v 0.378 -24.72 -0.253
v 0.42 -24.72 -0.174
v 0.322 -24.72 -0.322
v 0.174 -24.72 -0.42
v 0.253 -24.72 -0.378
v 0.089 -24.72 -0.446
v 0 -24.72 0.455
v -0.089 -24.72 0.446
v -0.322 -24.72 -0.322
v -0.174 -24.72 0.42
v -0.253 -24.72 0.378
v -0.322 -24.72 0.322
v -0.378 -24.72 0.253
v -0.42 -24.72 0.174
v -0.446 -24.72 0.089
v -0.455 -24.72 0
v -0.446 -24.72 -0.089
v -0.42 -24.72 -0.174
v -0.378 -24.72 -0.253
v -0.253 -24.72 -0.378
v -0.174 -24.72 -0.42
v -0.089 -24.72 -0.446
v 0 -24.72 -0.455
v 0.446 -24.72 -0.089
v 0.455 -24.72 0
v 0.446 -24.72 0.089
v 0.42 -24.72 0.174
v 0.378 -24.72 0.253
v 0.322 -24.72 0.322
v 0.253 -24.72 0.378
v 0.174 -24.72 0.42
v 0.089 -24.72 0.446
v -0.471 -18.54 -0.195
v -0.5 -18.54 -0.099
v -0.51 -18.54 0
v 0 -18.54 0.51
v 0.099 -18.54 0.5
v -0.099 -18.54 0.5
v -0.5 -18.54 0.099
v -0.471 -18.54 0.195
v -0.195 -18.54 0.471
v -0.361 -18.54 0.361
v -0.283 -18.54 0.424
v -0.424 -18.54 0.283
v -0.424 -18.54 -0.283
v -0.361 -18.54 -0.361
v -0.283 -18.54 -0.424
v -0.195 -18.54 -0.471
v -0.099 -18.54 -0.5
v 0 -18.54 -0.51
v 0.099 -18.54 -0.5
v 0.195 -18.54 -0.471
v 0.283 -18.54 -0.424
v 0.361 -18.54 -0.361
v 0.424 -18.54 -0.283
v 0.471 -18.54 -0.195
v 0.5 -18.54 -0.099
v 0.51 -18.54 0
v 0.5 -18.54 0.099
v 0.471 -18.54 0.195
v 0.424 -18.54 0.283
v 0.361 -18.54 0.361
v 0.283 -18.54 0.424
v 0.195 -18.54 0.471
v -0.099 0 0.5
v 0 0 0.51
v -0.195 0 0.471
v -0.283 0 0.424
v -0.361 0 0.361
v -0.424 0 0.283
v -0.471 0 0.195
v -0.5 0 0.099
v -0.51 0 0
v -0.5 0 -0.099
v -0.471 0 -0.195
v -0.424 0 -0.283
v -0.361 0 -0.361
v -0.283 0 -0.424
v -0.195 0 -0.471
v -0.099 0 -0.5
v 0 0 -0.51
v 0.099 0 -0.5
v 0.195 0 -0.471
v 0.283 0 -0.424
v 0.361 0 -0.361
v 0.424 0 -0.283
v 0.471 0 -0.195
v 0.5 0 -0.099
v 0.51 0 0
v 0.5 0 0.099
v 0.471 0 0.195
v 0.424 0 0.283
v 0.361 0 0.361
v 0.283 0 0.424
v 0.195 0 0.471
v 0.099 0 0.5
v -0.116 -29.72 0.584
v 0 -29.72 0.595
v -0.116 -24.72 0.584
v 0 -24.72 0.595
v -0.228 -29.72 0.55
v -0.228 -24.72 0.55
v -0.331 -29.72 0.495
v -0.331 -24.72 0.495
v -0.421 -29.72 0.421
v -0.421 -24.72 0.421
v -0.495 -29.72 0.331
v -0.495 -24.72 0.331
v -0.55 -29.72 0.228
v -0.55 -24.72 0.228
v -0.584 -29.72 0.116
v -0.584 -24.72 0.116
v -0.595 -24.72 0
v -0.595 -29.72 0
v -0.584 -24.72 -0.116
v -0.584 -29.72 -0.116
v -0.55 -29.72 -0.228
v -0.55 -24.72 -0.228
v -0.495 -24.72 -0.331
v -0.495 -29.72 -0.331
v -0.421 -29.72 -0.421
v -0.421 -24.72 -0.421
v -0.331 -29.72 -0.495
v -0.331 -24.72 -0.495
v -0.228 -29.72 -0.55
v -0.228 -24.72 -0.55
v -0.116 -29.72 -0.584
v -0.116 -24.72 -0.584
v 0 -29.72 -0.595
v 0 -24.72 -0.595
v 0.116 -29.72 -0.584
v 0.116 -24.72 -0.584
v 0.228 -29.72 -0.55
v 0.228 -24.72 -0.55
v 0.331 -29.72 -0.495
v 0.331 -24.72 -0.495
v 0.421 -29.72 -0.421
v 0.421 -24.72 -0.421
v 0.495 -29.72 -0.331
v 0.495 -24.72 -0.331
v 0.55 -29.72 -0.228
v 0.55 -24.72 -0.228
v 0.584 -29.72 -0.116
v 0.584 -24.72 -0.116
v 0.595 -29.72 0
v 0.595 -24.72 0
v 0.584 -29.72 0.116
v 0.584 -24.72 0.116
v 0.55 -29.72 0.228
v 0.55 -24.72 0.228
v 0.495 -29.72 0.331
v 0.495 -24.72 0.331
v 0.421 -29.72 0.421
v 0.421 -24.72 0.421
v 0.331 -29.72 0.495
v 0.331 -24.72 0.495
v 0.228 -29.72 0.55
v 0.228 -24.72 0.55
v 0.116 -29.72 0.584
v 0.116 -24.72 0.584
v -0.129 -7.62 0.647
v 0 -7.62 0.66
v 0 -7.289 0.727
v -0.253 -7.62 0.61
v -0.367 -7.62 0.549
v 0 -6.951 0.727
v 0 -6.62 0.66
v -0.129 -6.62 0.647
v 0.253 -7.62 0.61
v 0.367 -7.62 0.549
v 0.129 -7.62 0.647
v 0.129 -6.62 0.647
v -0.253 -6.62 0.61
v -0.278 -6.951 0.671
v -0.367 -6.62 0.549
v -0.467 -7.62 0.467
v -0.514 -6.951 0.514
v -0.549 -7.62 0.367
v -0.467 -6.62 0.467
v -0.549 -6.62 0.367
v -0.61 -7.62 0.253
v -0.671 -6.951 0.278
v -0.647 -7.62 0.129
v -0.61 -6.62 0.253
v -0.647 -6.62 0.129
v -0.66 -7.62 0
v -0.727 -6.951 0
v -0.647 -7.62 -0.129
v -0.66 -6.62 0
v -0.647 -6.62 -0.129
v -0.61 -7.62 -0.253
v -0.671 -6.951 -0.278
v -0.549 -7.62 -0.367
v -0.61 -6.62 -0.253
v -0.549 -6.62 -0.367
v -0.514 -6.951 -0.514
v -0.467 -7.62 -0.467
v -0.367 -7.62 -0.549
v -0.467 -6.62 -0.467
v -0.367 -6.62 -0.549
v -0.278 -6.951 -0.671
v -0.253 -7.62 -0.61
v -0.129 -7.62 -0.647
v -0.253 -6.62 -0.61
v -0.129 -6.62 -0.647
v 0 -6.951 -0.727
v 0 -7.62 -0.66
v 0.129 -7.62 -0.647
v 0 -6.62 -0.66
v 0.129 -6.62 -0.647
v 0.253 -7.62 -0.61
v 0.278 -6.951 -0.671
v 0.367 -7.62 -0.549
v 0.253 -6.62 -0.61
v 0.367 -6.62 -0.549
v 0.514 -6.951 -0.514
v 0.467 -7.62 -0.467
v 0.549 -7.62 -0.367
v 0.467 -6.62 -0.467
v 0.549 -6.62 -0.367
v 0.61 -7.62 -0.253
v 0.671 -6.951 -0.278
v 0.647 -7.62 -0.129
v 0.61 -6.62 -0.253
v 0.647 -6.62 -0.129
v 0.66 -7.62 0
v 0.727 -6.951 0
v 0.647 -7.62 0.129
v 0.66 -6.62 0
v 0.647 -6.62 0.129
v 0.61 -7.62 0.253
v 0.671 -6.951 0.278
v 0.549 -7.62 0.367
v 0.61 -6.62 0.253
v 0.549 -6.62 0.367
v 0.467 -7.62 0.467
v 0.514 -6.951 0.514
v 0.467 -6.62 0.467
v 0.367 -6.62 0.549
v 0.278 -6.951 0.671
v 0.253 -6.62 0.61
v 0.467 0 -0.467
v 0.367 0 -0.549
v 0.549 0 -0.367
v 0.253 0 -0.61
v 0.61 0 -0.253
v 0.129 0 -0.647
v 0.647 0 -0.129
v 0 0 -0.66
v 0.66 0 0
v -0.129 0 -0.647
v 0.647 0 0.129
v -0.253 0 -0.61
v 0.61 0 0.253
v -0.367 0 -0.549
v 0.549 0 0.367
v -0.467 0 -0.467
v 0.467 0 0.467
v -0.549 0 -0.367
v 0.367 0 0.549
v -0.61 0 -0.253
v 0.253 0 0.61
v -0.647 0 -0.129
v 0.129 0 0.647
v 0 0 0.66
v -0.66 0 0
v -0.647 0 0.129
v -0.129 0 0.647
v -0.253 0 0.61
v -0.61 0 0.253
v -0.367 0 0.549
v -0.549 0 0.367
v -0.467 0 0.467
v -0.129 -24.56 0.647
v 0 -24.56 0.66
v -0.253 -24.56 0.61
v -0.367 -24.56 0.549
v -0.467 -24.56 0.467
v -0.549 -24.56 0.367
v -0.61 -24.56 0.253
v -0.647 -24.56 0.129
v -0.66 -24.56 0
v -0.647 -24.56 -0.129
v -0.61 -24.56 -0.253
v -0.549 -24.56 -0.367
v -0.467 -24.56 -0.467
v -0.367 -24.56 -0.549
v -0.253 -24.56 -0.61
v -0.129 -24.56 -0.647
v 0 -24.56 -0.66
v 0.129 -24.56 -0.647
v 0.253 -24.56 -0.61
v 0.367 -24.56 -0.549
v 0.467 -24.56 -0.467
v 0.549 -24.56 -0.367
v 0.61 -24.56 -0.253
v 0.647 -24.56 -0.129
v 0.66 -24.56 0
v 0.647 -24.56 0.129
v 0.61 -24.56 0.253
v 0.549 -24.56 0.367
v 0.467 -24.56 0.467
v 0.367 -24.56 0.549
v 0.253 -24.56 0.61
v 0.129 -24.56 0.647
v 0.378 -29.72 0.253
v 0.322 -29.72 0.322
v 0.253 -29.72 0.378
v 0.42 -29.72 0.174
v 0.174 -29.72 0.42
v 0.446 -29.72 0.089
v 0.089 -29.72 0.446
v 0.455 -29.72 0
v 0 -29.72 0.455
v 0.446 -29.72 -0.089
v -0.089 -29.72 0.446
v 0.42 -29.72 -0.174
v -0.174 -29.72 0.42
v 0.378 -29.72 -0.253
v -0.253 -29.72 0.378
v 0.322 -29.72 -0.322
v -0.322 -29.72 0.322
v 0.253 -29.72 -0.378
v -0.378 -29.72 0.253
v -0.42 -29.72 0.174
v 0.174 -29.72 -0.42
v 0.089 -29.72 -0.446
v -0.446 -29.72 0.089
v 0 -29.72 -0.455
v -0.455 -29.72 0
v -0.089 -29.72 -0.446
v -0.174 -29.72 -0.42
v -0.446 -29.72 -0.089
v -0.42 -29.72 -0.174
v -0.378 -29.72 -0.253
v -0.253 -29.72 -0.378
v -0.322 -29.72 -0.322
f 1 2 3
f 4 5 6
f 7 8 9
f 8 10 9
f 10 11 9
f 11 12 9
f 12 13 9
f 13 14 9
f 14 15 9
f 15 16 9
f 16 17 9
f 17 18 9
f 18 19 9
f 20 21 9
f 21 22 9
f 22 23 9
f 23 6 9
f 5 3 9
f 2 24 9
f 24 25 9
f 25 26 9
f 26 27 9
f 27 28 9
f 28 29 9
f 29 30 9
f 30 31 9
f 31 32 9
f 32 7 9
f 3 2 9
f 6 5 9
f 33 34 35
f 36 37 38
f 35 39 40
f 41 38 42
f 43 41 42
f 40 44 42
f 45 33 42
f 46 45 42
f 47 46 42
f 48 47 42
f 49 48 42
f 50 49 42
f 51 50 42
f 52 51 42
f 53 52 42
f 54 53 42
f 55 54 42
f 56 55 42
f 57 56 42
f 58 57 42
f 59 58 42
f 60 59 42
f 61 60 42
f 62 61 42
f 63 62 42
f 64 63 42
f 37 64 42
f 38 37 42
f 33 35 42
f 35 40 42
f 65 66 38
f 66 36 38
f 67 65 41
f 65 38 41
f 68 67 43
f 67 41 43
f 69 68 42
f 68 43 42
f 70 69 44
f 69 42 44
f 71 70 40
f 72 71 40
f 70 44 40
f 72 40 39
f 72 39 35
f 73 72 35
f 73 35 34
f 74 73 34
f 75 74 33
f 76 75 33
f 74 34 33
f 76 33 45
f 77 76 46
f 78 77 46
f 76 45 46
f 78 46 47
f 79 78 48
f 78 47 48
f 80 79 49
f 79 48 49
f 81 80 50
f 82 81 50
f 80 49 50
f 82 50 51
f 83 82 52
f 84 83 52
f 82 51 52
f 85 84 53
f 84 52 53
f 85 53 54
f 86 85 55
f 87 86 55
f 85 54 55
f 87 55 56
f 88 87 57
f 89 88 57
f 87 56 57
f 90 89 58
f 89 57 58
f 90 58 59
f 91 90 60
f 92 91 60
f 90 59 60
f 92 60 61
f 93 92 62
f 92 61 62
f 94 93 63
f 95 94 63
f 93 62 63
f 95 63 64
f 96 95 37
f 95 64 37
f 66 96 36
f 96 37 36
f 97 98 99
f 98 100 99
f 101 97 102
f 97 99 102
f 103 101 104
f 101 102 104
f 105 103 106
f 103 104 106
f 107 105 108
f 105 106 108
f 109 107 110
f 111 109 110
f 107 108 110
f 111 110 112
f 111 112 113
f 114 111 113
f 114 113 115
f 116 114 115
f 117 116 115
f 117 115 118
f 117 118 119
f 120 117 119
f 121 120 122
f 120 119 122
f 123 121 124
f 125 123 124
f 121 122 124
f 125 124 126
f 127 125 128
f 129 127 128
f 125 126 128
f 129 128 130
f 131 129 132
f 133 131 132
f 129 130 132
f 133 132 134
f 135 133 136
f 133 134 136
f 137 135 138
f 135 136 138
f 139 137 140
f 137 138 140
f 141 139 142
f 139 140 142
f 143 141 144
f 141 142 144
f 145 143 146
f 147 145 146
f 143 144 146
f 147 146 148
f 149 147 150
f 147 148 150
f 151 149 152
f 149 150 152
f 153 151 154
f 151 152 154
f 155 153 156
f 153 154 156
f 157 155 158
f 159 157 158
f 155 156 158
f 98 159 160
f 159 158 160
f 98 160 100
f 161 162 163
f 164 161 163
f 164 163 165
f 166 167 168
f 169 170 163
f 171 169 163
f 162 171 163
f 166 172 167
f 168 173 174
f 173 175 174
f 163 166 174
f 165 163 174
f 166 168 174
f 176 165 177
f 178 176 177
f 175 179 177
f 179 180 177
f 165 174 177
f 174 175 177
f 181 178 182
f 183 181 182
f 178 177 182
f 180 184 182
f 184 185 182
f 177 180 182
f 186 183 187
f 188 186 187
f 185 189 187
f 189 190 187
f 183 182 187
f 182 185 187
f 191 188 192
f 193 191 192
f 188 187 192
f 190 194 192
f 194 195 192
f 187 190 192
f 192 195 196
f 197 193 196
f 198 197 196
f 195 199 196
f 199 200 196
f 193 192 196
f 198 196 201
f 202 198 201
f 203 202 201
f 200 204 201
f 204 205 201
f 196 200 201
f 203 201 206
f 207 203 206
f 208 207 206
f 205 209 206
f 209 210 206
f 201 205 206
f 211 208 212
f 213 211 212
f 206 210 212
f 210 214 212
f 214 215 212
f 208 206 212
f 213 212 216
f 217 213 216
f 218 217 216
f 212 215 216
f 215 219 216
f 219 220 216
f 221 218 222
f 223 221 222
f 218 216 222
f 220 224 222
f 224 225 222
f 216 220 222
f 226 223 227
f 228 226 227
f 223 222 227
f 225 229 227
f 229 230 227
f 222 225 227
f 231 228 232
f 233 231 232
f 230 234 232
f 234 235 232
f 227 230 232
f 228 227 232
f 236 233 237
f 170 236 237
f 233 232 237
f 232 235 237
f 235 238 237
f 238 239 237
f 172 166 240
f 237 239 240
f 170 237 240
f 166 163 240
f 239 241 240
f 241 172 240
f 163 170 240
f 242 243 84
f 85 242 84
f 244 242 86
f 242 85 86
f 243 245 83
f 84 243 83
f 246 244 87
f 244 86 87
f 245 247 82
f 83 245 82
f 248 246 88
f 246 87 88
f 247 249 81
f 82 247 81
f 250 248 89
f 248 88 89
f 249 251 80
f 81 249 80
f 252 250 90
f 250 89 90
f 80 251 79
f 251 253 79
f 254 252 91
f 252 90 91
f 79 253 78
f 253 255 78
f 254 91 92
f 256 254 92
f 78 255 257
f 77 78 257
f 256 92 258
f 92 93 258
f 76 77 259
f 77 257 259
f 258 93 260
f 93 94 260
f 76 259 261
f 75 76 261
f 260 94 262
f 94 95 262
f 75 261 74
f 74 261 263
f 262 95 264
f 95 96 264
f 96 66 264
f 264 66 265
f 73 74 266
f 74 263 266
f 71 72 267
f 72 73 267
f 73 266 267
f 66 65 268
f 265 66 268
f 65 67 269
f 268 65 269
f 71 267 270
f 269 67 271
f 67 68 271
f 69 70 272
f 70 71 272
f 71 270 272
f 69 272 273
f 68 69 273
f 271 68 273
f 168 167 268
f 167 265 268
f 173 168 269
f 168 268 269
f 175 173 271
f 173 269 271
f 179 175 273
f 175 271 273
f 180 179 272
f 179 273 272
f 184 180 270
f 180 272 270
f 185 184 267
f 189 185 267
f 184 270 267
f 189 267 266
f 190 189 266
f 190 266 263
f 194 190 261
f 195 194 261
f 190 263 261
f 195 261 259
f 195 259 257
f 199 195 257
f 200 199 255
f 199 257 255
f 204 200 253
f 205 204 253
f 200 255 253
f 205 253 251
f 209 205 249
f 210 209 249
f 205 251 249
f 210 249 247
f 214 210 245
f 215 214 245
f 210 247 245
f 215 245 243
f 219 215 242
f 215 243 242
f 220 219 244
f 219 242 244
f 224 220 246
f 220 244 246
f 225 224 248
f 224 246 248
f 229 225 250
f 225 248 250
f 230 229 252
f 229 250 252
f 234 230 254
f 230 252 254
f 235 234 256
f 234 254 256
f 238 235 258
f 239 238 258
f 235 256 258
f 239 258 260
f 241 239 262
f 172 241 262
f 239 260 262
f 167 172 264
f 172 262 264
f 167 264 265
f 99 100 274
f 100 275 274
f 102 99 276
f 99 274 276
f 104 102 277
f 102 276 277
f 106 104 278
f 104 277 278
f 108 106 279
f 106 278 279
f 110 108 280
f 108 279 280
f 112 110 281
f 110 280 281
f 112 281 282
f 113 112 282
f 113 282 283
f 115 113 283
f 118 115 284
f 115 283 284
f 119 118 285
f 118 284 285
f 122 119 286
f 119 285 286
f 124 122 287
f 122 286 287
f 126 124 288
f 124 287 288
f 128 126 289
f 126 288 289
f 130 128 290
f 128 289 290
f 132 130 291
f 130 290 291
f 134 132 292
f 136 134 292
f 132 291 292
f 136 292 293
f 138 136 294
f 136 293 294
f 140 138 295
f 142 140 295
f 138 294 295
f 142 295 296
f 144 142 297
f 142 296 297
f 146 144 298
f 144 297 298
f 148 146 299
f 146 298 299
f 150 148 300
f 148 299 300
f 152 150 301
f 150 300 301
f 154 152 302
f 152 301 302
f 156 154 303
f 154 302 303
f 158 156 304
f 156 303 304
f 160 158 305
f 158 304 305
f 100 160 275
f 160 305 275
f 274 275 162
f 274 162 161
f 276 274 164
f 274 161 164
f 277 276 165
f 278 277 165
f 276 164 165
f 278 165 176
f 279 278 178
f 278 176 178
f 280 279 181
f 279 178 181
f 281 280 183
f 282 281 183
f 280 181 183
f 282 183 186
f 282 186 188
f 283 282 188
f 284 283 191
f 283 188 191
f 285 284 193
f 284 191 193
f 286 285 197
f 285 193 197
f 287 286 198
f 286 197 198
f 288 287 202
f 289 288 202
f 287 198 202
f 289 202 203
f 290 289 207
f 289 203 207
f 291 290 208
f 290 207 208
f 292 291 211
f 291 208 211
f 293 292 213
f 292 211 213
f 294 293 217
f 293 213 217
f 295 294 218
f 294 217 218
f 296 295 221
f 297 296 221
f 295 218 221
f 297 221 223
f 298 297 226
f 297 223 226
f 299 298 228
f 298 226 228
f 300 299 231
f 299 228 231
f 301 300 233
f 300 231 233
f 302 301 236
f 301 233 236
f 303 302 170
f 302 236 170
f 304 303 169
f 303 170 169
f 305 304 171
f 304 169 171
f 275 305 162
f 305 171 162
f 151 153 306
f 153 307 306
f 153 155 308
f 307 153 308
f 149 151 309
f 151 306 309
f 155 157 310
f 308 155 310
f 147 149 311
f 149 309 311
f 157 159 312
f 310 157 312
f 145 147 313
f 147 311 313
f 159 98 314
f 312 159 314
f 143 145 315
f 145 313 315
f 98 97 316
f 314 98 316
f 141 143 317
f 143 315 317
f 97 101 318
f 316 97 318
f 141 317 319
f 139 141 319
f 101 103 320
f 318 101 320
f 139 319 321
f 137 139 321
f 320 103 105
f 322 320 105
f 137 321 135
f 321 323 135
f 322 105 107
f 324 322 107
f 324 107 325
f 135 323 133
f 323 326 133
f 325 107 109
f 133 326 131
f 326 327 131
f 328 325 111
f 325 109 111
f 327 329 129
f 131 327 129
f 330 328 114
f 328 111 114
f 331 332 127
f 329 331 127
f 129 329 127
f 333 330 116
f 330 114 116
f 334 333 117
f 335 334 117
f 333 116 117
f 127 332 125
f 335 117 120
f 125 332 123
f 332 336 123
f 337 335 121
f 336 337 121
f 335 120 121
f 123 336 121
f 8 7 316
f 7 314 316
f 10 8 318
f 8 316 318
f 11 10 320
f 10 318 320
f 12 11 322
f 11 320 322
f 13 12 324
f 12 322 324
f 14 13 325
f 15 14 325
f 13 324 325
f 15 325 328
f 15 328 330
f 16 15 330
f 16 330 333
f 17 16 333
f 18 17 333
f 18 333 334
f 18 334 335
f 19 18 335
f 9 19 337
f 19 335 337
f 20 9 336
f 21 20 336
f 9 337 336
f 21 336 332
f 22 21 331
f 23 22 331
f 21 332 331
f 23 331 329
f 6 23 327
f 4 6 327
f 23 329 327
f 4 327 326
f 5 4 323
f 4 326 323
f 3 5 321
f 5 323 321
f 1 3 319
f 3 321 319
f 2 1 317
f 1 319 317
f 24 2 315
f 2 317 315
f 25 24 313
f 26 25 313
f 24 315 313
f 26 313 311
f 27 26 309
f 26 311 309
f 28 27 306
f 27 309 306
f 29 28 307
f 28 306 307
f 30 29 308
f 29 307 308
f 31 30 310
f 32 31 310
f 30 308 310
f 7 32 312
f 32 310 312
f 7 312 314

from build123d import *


with BuildPart() as part:
    # Sketch1 → Revolve1 (revolve)
    with BuildSketch(Plane(origin=(0, 0, 0), x_dir=(0, 0, -1), z_dir=(1, 0, 0)), mode=Mode.PRIVATE) as revolve1_sk:
        with BuildLine():
            Line((0.51, 0), (0.51, -18.54))
            Line((0.51, -18.54), (0, -18.54))
            Line((0, -18.54), (0, -24.72))
            Line((0, -24.72), (0.455, -24.72))
            Line((0.455, -24.72), (0.455, -29.72))
            Line((0.455, -29.72), (0.595, -29.72))
            Line((0.595, -29.72), (0.595, -24.72))
            Line((0.595, -24.72), (0.66, -24.56))
            Line((0.66, -24.56), (0.66, -7.62))
            ThreePointArc((0.66, -7.62), (0.735, -7.12), (0.66, -6.62))
            Line((0.66, -6.62), (0.66, 0))
            Line((0.66, 0), (0.51, 0))
        make_face()
    revolve(revolve1_sk.sketch.rotate(Axis((0, -18.54, 0), (0, -1, 0)), 180), axis=Axis((0, -18.54, 0), (0, -1, 0)))


solid = part.part
